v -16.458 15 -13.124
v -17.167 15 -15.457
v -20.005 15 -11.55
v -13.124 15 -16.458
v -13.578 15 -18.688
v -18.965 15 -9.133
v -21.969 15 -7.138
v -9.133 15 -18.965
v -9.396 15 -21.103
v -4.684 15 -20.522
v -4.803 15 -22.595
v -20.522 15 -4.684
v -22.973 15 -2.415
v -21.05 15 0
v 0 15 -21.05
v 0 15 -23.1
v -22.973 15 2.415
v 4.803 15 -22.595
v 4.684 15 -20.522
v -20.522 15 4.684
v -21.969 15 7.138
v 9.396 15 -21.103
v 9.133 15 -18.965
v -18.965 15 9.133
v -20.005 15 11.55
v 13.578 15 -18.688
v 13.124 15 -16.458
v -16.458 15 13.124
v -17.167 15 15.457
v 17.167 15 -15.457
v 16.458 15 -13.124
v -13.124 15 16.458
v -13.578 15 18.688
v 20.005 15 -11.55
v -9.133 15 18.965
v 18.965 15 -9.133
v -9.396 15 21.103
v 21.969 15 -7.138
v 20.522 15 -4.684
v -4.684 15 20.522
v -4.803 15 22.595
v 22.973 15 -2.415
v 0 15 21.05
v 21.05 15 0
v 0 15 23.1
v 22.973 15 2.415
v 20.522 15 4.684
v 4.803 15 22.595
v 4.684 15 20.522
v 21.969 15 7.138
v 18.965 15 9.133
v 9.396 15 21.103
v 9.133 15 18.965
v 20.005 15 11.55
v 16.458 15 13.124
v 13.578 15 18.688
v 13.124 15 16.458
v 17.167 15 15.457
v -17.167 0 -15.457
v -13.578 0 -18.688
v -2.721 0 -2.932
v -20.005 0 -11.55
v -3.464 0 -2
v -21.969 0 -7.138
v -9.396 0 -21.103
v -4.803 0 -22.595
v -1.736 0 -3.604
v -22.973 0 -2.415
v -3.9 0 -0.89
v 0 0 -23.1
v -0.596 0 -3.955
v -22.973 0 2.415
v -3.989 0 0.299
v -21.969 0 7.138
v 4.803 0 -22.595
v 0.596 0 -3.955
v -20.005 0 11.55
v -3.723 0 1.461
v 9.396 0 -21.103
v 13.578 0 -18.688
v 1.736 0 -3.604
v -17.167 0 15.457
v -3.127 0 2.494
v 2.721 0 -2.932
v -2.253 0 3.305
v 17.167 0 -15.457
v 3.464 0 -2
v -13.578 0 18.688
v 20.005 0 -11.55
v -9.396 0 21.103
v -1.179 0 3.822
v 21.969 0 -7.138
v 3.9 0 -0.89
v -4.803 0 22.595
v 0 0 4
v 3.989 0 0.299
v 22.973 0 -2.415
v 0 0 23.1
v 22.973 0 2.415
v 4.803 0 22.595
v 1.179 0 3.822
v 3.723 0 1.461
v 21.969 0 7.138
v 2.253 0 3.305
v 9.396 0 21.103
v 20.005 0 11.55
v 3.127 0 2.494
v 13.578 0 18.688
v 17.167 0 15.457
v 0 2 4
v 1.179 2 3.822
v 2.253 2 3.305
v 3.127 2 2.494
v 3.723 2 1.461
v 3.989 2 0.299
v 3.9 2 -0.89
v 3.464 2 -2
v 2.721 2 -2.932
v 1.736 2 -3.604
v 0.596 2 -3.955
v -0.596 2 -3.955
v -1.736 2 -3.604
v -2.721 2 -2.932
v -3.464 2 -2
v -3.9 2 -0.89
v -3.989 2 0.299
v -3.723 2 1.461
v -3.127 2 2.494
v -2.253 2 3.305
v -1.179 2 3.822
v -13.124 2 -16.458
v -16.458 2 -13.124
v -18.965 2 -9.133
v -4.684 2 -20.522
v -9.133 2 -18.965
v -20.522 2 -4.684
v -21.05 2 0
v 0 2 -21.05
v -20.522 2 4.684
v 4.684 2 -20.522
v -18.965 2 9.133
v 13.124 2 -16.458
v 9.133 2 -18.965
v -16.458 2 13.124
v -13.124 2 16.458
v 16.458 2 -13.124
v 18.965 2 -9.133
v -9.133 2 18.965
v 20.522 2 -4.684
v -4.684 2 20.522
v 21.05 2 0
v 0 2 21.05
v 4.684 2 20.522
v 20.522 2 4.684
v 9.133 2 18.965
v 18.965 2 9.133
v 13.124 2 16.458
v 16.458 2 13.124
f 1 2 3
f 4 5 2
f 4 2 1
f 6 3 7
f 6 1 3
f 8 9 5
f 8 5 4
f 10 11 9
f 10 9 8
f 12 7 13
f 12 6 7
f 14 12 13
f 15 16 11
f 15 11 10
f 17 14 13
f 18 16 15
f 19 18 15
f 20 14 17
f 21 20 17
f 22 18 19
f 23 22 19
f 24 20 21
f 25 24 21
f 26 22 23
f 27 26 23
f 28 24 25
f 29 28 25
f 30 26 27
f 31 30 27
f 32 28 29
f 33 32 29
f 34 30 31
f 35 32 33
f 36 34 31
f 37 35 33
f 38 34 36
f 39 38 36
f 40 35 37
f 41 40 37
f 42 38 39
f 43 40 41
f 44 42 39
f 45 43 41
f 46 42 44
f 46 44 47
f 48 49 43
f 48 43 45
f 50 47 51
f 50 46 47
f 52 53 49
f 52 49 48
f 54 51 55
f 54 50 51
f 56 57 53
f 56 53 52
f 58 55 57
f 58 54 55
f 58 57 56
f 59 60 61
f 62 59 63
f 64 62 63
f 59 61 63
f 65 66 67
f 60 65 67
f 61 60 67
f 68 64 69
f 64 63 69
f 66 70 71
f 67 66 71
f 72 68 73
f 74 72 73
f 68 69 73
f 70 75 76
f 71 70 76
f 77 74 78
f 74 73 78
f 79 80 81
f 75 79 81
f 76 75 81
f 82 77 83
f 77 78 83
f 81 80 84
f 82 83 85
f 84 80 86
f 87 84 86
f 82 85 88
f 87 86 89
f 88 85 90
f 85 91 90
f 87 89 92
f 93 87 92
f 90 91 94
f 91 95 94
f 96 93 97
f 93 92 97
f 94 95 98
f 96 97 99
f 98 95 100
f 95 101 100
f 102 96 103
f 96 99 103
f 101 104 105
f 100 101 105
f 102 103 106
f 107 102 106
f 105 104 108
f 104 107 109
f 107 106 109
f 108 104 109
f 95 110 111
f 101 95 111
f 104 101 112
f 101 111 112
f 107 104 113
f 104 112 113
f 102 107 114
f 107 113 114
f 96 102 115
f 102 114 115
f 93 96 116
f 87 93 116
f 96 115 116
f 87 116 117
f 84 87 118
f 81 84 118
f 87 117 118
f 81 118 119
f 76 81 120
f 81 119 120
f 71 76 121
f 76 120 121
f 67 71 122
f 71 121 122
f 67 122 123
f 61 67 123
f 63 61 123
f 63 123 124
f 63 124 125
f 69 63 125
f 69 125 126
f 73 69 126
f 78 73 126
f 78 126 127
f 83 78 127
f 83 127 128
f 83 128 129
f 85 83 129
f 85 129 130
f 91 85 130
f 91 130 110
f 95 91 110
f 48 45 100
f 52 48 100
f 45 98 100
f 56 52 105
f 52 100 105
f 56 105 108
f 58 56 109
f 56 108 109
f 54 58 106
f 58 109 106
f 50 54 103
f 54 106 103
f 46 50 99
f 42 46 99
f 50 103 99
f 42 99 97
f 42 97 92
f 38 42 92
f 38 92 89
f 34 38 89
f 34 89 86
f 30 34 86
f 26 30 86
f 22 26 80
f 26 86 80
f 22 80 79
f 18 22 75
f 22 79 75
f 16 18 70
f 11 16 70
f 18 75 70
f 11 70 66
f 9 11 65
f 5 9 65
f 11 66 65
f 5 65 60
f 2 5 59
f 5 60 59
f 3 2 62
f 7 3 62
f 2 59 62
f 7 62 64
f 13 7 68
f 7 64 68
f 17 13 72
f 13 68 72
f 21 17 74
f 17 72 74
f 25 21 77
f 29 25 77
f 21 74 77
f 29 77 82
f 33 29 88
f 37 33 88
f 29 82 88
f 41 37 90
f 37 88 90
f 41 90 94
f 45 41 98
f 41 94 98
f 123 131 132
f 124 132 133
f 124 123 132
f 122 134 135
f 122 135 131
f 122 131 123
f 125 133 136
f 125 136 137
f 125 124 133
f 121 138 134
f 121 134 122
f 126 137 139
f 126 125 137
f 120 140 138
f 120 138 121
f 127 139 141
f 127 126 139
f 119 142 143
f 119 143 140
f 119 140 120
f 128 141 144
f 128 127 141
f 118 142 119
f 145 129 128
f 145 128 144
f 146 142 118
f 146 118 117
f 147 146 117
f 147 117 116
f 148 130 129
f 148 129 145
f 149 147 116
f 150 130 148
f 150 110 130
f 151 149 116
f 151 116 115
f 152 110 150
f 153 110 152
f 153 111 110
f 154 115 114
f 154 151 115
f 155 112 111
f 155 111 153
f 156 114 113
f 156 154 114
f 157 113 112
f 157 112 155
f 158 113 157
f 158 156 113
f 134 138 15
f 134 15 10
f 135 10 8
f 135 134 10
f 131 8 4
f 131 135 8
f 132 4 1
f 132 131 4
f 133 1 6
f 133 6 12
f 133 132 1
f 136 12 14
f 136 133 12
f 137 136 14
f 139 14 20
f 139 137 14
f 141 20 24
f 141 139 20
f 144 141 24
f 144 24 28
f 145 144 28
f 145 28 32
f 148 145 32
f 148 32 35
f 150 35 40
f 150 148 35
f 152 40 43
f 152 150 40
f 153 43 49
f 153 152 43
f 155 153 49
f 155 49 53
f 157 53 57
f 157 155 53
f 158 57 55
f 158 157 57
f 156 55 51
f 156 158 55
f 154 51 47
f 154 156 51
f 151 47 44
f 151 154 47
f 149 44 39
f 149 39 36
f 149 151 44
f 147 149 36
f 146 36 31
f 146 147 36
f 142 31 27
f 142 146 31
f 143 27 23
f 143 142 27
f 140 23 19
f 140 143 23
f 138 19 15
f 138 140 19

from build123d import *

# Parameters (mm, degrees)
SKETCH_1_R          = 23.1
EXTRUDE_1_DEPTH     = 2
SKETCH_2_R          = 23.1
SKETCH_2_R_2        = 21.05
EXTRUDE_2_DEPTH     = 13
SKETCH_3_R          = 4
CUT_EXTRUDE_1_DEPTH = 36.159920364


with BuildPart() as part:
    # 草图1 → 凸台-拉伸1 (new body)
    with BuildSketch(Plane(origin=(0, 0, 0), x_dir=(1, 0, 0), z_dir=(0, 1, 0))):
        with Locations(Location((0, 0, 0), (0, 0, 270))):
            Circle(SKETCH_1_R)
    extrude(amount=EXTRUDE_1_DEPTH)

    # 草图2 → 凸台-拉伸2 (add)
    with BuildSketch(Plane(origin=(0, 2, 0), x_dir=(1, 0, 0), z_dir=(0, 1, 0))):
        with Locations(Location((0, 0, 0), (0, 0, 270))):
            Circle(SKETCH_2_R)
        with Locations(Location((0, 0, 0), (0, 0, 90))):
            Circle(SKETCH_2_R_2, mode=Mode.SUBTRACT)
    extrude(amount=EXTRUDE_2_DEPTH)

    # 草图3 → 切除-拉伸1 (cut, through all)
    with BuildSketch(Plane(origin=(0, 2, 0), x_dir=(1, 0, 0), z_dir=(0, 1, 0))):
        with Locations(Location((0, 0, 0), (0, 0, 270))):
            Circle(SKETCH_3_R)
    extrude(amount=-CUT_EXTRUDE_1_DEPTH, mode=Mode.SUBTRACT)


solid = part.part
